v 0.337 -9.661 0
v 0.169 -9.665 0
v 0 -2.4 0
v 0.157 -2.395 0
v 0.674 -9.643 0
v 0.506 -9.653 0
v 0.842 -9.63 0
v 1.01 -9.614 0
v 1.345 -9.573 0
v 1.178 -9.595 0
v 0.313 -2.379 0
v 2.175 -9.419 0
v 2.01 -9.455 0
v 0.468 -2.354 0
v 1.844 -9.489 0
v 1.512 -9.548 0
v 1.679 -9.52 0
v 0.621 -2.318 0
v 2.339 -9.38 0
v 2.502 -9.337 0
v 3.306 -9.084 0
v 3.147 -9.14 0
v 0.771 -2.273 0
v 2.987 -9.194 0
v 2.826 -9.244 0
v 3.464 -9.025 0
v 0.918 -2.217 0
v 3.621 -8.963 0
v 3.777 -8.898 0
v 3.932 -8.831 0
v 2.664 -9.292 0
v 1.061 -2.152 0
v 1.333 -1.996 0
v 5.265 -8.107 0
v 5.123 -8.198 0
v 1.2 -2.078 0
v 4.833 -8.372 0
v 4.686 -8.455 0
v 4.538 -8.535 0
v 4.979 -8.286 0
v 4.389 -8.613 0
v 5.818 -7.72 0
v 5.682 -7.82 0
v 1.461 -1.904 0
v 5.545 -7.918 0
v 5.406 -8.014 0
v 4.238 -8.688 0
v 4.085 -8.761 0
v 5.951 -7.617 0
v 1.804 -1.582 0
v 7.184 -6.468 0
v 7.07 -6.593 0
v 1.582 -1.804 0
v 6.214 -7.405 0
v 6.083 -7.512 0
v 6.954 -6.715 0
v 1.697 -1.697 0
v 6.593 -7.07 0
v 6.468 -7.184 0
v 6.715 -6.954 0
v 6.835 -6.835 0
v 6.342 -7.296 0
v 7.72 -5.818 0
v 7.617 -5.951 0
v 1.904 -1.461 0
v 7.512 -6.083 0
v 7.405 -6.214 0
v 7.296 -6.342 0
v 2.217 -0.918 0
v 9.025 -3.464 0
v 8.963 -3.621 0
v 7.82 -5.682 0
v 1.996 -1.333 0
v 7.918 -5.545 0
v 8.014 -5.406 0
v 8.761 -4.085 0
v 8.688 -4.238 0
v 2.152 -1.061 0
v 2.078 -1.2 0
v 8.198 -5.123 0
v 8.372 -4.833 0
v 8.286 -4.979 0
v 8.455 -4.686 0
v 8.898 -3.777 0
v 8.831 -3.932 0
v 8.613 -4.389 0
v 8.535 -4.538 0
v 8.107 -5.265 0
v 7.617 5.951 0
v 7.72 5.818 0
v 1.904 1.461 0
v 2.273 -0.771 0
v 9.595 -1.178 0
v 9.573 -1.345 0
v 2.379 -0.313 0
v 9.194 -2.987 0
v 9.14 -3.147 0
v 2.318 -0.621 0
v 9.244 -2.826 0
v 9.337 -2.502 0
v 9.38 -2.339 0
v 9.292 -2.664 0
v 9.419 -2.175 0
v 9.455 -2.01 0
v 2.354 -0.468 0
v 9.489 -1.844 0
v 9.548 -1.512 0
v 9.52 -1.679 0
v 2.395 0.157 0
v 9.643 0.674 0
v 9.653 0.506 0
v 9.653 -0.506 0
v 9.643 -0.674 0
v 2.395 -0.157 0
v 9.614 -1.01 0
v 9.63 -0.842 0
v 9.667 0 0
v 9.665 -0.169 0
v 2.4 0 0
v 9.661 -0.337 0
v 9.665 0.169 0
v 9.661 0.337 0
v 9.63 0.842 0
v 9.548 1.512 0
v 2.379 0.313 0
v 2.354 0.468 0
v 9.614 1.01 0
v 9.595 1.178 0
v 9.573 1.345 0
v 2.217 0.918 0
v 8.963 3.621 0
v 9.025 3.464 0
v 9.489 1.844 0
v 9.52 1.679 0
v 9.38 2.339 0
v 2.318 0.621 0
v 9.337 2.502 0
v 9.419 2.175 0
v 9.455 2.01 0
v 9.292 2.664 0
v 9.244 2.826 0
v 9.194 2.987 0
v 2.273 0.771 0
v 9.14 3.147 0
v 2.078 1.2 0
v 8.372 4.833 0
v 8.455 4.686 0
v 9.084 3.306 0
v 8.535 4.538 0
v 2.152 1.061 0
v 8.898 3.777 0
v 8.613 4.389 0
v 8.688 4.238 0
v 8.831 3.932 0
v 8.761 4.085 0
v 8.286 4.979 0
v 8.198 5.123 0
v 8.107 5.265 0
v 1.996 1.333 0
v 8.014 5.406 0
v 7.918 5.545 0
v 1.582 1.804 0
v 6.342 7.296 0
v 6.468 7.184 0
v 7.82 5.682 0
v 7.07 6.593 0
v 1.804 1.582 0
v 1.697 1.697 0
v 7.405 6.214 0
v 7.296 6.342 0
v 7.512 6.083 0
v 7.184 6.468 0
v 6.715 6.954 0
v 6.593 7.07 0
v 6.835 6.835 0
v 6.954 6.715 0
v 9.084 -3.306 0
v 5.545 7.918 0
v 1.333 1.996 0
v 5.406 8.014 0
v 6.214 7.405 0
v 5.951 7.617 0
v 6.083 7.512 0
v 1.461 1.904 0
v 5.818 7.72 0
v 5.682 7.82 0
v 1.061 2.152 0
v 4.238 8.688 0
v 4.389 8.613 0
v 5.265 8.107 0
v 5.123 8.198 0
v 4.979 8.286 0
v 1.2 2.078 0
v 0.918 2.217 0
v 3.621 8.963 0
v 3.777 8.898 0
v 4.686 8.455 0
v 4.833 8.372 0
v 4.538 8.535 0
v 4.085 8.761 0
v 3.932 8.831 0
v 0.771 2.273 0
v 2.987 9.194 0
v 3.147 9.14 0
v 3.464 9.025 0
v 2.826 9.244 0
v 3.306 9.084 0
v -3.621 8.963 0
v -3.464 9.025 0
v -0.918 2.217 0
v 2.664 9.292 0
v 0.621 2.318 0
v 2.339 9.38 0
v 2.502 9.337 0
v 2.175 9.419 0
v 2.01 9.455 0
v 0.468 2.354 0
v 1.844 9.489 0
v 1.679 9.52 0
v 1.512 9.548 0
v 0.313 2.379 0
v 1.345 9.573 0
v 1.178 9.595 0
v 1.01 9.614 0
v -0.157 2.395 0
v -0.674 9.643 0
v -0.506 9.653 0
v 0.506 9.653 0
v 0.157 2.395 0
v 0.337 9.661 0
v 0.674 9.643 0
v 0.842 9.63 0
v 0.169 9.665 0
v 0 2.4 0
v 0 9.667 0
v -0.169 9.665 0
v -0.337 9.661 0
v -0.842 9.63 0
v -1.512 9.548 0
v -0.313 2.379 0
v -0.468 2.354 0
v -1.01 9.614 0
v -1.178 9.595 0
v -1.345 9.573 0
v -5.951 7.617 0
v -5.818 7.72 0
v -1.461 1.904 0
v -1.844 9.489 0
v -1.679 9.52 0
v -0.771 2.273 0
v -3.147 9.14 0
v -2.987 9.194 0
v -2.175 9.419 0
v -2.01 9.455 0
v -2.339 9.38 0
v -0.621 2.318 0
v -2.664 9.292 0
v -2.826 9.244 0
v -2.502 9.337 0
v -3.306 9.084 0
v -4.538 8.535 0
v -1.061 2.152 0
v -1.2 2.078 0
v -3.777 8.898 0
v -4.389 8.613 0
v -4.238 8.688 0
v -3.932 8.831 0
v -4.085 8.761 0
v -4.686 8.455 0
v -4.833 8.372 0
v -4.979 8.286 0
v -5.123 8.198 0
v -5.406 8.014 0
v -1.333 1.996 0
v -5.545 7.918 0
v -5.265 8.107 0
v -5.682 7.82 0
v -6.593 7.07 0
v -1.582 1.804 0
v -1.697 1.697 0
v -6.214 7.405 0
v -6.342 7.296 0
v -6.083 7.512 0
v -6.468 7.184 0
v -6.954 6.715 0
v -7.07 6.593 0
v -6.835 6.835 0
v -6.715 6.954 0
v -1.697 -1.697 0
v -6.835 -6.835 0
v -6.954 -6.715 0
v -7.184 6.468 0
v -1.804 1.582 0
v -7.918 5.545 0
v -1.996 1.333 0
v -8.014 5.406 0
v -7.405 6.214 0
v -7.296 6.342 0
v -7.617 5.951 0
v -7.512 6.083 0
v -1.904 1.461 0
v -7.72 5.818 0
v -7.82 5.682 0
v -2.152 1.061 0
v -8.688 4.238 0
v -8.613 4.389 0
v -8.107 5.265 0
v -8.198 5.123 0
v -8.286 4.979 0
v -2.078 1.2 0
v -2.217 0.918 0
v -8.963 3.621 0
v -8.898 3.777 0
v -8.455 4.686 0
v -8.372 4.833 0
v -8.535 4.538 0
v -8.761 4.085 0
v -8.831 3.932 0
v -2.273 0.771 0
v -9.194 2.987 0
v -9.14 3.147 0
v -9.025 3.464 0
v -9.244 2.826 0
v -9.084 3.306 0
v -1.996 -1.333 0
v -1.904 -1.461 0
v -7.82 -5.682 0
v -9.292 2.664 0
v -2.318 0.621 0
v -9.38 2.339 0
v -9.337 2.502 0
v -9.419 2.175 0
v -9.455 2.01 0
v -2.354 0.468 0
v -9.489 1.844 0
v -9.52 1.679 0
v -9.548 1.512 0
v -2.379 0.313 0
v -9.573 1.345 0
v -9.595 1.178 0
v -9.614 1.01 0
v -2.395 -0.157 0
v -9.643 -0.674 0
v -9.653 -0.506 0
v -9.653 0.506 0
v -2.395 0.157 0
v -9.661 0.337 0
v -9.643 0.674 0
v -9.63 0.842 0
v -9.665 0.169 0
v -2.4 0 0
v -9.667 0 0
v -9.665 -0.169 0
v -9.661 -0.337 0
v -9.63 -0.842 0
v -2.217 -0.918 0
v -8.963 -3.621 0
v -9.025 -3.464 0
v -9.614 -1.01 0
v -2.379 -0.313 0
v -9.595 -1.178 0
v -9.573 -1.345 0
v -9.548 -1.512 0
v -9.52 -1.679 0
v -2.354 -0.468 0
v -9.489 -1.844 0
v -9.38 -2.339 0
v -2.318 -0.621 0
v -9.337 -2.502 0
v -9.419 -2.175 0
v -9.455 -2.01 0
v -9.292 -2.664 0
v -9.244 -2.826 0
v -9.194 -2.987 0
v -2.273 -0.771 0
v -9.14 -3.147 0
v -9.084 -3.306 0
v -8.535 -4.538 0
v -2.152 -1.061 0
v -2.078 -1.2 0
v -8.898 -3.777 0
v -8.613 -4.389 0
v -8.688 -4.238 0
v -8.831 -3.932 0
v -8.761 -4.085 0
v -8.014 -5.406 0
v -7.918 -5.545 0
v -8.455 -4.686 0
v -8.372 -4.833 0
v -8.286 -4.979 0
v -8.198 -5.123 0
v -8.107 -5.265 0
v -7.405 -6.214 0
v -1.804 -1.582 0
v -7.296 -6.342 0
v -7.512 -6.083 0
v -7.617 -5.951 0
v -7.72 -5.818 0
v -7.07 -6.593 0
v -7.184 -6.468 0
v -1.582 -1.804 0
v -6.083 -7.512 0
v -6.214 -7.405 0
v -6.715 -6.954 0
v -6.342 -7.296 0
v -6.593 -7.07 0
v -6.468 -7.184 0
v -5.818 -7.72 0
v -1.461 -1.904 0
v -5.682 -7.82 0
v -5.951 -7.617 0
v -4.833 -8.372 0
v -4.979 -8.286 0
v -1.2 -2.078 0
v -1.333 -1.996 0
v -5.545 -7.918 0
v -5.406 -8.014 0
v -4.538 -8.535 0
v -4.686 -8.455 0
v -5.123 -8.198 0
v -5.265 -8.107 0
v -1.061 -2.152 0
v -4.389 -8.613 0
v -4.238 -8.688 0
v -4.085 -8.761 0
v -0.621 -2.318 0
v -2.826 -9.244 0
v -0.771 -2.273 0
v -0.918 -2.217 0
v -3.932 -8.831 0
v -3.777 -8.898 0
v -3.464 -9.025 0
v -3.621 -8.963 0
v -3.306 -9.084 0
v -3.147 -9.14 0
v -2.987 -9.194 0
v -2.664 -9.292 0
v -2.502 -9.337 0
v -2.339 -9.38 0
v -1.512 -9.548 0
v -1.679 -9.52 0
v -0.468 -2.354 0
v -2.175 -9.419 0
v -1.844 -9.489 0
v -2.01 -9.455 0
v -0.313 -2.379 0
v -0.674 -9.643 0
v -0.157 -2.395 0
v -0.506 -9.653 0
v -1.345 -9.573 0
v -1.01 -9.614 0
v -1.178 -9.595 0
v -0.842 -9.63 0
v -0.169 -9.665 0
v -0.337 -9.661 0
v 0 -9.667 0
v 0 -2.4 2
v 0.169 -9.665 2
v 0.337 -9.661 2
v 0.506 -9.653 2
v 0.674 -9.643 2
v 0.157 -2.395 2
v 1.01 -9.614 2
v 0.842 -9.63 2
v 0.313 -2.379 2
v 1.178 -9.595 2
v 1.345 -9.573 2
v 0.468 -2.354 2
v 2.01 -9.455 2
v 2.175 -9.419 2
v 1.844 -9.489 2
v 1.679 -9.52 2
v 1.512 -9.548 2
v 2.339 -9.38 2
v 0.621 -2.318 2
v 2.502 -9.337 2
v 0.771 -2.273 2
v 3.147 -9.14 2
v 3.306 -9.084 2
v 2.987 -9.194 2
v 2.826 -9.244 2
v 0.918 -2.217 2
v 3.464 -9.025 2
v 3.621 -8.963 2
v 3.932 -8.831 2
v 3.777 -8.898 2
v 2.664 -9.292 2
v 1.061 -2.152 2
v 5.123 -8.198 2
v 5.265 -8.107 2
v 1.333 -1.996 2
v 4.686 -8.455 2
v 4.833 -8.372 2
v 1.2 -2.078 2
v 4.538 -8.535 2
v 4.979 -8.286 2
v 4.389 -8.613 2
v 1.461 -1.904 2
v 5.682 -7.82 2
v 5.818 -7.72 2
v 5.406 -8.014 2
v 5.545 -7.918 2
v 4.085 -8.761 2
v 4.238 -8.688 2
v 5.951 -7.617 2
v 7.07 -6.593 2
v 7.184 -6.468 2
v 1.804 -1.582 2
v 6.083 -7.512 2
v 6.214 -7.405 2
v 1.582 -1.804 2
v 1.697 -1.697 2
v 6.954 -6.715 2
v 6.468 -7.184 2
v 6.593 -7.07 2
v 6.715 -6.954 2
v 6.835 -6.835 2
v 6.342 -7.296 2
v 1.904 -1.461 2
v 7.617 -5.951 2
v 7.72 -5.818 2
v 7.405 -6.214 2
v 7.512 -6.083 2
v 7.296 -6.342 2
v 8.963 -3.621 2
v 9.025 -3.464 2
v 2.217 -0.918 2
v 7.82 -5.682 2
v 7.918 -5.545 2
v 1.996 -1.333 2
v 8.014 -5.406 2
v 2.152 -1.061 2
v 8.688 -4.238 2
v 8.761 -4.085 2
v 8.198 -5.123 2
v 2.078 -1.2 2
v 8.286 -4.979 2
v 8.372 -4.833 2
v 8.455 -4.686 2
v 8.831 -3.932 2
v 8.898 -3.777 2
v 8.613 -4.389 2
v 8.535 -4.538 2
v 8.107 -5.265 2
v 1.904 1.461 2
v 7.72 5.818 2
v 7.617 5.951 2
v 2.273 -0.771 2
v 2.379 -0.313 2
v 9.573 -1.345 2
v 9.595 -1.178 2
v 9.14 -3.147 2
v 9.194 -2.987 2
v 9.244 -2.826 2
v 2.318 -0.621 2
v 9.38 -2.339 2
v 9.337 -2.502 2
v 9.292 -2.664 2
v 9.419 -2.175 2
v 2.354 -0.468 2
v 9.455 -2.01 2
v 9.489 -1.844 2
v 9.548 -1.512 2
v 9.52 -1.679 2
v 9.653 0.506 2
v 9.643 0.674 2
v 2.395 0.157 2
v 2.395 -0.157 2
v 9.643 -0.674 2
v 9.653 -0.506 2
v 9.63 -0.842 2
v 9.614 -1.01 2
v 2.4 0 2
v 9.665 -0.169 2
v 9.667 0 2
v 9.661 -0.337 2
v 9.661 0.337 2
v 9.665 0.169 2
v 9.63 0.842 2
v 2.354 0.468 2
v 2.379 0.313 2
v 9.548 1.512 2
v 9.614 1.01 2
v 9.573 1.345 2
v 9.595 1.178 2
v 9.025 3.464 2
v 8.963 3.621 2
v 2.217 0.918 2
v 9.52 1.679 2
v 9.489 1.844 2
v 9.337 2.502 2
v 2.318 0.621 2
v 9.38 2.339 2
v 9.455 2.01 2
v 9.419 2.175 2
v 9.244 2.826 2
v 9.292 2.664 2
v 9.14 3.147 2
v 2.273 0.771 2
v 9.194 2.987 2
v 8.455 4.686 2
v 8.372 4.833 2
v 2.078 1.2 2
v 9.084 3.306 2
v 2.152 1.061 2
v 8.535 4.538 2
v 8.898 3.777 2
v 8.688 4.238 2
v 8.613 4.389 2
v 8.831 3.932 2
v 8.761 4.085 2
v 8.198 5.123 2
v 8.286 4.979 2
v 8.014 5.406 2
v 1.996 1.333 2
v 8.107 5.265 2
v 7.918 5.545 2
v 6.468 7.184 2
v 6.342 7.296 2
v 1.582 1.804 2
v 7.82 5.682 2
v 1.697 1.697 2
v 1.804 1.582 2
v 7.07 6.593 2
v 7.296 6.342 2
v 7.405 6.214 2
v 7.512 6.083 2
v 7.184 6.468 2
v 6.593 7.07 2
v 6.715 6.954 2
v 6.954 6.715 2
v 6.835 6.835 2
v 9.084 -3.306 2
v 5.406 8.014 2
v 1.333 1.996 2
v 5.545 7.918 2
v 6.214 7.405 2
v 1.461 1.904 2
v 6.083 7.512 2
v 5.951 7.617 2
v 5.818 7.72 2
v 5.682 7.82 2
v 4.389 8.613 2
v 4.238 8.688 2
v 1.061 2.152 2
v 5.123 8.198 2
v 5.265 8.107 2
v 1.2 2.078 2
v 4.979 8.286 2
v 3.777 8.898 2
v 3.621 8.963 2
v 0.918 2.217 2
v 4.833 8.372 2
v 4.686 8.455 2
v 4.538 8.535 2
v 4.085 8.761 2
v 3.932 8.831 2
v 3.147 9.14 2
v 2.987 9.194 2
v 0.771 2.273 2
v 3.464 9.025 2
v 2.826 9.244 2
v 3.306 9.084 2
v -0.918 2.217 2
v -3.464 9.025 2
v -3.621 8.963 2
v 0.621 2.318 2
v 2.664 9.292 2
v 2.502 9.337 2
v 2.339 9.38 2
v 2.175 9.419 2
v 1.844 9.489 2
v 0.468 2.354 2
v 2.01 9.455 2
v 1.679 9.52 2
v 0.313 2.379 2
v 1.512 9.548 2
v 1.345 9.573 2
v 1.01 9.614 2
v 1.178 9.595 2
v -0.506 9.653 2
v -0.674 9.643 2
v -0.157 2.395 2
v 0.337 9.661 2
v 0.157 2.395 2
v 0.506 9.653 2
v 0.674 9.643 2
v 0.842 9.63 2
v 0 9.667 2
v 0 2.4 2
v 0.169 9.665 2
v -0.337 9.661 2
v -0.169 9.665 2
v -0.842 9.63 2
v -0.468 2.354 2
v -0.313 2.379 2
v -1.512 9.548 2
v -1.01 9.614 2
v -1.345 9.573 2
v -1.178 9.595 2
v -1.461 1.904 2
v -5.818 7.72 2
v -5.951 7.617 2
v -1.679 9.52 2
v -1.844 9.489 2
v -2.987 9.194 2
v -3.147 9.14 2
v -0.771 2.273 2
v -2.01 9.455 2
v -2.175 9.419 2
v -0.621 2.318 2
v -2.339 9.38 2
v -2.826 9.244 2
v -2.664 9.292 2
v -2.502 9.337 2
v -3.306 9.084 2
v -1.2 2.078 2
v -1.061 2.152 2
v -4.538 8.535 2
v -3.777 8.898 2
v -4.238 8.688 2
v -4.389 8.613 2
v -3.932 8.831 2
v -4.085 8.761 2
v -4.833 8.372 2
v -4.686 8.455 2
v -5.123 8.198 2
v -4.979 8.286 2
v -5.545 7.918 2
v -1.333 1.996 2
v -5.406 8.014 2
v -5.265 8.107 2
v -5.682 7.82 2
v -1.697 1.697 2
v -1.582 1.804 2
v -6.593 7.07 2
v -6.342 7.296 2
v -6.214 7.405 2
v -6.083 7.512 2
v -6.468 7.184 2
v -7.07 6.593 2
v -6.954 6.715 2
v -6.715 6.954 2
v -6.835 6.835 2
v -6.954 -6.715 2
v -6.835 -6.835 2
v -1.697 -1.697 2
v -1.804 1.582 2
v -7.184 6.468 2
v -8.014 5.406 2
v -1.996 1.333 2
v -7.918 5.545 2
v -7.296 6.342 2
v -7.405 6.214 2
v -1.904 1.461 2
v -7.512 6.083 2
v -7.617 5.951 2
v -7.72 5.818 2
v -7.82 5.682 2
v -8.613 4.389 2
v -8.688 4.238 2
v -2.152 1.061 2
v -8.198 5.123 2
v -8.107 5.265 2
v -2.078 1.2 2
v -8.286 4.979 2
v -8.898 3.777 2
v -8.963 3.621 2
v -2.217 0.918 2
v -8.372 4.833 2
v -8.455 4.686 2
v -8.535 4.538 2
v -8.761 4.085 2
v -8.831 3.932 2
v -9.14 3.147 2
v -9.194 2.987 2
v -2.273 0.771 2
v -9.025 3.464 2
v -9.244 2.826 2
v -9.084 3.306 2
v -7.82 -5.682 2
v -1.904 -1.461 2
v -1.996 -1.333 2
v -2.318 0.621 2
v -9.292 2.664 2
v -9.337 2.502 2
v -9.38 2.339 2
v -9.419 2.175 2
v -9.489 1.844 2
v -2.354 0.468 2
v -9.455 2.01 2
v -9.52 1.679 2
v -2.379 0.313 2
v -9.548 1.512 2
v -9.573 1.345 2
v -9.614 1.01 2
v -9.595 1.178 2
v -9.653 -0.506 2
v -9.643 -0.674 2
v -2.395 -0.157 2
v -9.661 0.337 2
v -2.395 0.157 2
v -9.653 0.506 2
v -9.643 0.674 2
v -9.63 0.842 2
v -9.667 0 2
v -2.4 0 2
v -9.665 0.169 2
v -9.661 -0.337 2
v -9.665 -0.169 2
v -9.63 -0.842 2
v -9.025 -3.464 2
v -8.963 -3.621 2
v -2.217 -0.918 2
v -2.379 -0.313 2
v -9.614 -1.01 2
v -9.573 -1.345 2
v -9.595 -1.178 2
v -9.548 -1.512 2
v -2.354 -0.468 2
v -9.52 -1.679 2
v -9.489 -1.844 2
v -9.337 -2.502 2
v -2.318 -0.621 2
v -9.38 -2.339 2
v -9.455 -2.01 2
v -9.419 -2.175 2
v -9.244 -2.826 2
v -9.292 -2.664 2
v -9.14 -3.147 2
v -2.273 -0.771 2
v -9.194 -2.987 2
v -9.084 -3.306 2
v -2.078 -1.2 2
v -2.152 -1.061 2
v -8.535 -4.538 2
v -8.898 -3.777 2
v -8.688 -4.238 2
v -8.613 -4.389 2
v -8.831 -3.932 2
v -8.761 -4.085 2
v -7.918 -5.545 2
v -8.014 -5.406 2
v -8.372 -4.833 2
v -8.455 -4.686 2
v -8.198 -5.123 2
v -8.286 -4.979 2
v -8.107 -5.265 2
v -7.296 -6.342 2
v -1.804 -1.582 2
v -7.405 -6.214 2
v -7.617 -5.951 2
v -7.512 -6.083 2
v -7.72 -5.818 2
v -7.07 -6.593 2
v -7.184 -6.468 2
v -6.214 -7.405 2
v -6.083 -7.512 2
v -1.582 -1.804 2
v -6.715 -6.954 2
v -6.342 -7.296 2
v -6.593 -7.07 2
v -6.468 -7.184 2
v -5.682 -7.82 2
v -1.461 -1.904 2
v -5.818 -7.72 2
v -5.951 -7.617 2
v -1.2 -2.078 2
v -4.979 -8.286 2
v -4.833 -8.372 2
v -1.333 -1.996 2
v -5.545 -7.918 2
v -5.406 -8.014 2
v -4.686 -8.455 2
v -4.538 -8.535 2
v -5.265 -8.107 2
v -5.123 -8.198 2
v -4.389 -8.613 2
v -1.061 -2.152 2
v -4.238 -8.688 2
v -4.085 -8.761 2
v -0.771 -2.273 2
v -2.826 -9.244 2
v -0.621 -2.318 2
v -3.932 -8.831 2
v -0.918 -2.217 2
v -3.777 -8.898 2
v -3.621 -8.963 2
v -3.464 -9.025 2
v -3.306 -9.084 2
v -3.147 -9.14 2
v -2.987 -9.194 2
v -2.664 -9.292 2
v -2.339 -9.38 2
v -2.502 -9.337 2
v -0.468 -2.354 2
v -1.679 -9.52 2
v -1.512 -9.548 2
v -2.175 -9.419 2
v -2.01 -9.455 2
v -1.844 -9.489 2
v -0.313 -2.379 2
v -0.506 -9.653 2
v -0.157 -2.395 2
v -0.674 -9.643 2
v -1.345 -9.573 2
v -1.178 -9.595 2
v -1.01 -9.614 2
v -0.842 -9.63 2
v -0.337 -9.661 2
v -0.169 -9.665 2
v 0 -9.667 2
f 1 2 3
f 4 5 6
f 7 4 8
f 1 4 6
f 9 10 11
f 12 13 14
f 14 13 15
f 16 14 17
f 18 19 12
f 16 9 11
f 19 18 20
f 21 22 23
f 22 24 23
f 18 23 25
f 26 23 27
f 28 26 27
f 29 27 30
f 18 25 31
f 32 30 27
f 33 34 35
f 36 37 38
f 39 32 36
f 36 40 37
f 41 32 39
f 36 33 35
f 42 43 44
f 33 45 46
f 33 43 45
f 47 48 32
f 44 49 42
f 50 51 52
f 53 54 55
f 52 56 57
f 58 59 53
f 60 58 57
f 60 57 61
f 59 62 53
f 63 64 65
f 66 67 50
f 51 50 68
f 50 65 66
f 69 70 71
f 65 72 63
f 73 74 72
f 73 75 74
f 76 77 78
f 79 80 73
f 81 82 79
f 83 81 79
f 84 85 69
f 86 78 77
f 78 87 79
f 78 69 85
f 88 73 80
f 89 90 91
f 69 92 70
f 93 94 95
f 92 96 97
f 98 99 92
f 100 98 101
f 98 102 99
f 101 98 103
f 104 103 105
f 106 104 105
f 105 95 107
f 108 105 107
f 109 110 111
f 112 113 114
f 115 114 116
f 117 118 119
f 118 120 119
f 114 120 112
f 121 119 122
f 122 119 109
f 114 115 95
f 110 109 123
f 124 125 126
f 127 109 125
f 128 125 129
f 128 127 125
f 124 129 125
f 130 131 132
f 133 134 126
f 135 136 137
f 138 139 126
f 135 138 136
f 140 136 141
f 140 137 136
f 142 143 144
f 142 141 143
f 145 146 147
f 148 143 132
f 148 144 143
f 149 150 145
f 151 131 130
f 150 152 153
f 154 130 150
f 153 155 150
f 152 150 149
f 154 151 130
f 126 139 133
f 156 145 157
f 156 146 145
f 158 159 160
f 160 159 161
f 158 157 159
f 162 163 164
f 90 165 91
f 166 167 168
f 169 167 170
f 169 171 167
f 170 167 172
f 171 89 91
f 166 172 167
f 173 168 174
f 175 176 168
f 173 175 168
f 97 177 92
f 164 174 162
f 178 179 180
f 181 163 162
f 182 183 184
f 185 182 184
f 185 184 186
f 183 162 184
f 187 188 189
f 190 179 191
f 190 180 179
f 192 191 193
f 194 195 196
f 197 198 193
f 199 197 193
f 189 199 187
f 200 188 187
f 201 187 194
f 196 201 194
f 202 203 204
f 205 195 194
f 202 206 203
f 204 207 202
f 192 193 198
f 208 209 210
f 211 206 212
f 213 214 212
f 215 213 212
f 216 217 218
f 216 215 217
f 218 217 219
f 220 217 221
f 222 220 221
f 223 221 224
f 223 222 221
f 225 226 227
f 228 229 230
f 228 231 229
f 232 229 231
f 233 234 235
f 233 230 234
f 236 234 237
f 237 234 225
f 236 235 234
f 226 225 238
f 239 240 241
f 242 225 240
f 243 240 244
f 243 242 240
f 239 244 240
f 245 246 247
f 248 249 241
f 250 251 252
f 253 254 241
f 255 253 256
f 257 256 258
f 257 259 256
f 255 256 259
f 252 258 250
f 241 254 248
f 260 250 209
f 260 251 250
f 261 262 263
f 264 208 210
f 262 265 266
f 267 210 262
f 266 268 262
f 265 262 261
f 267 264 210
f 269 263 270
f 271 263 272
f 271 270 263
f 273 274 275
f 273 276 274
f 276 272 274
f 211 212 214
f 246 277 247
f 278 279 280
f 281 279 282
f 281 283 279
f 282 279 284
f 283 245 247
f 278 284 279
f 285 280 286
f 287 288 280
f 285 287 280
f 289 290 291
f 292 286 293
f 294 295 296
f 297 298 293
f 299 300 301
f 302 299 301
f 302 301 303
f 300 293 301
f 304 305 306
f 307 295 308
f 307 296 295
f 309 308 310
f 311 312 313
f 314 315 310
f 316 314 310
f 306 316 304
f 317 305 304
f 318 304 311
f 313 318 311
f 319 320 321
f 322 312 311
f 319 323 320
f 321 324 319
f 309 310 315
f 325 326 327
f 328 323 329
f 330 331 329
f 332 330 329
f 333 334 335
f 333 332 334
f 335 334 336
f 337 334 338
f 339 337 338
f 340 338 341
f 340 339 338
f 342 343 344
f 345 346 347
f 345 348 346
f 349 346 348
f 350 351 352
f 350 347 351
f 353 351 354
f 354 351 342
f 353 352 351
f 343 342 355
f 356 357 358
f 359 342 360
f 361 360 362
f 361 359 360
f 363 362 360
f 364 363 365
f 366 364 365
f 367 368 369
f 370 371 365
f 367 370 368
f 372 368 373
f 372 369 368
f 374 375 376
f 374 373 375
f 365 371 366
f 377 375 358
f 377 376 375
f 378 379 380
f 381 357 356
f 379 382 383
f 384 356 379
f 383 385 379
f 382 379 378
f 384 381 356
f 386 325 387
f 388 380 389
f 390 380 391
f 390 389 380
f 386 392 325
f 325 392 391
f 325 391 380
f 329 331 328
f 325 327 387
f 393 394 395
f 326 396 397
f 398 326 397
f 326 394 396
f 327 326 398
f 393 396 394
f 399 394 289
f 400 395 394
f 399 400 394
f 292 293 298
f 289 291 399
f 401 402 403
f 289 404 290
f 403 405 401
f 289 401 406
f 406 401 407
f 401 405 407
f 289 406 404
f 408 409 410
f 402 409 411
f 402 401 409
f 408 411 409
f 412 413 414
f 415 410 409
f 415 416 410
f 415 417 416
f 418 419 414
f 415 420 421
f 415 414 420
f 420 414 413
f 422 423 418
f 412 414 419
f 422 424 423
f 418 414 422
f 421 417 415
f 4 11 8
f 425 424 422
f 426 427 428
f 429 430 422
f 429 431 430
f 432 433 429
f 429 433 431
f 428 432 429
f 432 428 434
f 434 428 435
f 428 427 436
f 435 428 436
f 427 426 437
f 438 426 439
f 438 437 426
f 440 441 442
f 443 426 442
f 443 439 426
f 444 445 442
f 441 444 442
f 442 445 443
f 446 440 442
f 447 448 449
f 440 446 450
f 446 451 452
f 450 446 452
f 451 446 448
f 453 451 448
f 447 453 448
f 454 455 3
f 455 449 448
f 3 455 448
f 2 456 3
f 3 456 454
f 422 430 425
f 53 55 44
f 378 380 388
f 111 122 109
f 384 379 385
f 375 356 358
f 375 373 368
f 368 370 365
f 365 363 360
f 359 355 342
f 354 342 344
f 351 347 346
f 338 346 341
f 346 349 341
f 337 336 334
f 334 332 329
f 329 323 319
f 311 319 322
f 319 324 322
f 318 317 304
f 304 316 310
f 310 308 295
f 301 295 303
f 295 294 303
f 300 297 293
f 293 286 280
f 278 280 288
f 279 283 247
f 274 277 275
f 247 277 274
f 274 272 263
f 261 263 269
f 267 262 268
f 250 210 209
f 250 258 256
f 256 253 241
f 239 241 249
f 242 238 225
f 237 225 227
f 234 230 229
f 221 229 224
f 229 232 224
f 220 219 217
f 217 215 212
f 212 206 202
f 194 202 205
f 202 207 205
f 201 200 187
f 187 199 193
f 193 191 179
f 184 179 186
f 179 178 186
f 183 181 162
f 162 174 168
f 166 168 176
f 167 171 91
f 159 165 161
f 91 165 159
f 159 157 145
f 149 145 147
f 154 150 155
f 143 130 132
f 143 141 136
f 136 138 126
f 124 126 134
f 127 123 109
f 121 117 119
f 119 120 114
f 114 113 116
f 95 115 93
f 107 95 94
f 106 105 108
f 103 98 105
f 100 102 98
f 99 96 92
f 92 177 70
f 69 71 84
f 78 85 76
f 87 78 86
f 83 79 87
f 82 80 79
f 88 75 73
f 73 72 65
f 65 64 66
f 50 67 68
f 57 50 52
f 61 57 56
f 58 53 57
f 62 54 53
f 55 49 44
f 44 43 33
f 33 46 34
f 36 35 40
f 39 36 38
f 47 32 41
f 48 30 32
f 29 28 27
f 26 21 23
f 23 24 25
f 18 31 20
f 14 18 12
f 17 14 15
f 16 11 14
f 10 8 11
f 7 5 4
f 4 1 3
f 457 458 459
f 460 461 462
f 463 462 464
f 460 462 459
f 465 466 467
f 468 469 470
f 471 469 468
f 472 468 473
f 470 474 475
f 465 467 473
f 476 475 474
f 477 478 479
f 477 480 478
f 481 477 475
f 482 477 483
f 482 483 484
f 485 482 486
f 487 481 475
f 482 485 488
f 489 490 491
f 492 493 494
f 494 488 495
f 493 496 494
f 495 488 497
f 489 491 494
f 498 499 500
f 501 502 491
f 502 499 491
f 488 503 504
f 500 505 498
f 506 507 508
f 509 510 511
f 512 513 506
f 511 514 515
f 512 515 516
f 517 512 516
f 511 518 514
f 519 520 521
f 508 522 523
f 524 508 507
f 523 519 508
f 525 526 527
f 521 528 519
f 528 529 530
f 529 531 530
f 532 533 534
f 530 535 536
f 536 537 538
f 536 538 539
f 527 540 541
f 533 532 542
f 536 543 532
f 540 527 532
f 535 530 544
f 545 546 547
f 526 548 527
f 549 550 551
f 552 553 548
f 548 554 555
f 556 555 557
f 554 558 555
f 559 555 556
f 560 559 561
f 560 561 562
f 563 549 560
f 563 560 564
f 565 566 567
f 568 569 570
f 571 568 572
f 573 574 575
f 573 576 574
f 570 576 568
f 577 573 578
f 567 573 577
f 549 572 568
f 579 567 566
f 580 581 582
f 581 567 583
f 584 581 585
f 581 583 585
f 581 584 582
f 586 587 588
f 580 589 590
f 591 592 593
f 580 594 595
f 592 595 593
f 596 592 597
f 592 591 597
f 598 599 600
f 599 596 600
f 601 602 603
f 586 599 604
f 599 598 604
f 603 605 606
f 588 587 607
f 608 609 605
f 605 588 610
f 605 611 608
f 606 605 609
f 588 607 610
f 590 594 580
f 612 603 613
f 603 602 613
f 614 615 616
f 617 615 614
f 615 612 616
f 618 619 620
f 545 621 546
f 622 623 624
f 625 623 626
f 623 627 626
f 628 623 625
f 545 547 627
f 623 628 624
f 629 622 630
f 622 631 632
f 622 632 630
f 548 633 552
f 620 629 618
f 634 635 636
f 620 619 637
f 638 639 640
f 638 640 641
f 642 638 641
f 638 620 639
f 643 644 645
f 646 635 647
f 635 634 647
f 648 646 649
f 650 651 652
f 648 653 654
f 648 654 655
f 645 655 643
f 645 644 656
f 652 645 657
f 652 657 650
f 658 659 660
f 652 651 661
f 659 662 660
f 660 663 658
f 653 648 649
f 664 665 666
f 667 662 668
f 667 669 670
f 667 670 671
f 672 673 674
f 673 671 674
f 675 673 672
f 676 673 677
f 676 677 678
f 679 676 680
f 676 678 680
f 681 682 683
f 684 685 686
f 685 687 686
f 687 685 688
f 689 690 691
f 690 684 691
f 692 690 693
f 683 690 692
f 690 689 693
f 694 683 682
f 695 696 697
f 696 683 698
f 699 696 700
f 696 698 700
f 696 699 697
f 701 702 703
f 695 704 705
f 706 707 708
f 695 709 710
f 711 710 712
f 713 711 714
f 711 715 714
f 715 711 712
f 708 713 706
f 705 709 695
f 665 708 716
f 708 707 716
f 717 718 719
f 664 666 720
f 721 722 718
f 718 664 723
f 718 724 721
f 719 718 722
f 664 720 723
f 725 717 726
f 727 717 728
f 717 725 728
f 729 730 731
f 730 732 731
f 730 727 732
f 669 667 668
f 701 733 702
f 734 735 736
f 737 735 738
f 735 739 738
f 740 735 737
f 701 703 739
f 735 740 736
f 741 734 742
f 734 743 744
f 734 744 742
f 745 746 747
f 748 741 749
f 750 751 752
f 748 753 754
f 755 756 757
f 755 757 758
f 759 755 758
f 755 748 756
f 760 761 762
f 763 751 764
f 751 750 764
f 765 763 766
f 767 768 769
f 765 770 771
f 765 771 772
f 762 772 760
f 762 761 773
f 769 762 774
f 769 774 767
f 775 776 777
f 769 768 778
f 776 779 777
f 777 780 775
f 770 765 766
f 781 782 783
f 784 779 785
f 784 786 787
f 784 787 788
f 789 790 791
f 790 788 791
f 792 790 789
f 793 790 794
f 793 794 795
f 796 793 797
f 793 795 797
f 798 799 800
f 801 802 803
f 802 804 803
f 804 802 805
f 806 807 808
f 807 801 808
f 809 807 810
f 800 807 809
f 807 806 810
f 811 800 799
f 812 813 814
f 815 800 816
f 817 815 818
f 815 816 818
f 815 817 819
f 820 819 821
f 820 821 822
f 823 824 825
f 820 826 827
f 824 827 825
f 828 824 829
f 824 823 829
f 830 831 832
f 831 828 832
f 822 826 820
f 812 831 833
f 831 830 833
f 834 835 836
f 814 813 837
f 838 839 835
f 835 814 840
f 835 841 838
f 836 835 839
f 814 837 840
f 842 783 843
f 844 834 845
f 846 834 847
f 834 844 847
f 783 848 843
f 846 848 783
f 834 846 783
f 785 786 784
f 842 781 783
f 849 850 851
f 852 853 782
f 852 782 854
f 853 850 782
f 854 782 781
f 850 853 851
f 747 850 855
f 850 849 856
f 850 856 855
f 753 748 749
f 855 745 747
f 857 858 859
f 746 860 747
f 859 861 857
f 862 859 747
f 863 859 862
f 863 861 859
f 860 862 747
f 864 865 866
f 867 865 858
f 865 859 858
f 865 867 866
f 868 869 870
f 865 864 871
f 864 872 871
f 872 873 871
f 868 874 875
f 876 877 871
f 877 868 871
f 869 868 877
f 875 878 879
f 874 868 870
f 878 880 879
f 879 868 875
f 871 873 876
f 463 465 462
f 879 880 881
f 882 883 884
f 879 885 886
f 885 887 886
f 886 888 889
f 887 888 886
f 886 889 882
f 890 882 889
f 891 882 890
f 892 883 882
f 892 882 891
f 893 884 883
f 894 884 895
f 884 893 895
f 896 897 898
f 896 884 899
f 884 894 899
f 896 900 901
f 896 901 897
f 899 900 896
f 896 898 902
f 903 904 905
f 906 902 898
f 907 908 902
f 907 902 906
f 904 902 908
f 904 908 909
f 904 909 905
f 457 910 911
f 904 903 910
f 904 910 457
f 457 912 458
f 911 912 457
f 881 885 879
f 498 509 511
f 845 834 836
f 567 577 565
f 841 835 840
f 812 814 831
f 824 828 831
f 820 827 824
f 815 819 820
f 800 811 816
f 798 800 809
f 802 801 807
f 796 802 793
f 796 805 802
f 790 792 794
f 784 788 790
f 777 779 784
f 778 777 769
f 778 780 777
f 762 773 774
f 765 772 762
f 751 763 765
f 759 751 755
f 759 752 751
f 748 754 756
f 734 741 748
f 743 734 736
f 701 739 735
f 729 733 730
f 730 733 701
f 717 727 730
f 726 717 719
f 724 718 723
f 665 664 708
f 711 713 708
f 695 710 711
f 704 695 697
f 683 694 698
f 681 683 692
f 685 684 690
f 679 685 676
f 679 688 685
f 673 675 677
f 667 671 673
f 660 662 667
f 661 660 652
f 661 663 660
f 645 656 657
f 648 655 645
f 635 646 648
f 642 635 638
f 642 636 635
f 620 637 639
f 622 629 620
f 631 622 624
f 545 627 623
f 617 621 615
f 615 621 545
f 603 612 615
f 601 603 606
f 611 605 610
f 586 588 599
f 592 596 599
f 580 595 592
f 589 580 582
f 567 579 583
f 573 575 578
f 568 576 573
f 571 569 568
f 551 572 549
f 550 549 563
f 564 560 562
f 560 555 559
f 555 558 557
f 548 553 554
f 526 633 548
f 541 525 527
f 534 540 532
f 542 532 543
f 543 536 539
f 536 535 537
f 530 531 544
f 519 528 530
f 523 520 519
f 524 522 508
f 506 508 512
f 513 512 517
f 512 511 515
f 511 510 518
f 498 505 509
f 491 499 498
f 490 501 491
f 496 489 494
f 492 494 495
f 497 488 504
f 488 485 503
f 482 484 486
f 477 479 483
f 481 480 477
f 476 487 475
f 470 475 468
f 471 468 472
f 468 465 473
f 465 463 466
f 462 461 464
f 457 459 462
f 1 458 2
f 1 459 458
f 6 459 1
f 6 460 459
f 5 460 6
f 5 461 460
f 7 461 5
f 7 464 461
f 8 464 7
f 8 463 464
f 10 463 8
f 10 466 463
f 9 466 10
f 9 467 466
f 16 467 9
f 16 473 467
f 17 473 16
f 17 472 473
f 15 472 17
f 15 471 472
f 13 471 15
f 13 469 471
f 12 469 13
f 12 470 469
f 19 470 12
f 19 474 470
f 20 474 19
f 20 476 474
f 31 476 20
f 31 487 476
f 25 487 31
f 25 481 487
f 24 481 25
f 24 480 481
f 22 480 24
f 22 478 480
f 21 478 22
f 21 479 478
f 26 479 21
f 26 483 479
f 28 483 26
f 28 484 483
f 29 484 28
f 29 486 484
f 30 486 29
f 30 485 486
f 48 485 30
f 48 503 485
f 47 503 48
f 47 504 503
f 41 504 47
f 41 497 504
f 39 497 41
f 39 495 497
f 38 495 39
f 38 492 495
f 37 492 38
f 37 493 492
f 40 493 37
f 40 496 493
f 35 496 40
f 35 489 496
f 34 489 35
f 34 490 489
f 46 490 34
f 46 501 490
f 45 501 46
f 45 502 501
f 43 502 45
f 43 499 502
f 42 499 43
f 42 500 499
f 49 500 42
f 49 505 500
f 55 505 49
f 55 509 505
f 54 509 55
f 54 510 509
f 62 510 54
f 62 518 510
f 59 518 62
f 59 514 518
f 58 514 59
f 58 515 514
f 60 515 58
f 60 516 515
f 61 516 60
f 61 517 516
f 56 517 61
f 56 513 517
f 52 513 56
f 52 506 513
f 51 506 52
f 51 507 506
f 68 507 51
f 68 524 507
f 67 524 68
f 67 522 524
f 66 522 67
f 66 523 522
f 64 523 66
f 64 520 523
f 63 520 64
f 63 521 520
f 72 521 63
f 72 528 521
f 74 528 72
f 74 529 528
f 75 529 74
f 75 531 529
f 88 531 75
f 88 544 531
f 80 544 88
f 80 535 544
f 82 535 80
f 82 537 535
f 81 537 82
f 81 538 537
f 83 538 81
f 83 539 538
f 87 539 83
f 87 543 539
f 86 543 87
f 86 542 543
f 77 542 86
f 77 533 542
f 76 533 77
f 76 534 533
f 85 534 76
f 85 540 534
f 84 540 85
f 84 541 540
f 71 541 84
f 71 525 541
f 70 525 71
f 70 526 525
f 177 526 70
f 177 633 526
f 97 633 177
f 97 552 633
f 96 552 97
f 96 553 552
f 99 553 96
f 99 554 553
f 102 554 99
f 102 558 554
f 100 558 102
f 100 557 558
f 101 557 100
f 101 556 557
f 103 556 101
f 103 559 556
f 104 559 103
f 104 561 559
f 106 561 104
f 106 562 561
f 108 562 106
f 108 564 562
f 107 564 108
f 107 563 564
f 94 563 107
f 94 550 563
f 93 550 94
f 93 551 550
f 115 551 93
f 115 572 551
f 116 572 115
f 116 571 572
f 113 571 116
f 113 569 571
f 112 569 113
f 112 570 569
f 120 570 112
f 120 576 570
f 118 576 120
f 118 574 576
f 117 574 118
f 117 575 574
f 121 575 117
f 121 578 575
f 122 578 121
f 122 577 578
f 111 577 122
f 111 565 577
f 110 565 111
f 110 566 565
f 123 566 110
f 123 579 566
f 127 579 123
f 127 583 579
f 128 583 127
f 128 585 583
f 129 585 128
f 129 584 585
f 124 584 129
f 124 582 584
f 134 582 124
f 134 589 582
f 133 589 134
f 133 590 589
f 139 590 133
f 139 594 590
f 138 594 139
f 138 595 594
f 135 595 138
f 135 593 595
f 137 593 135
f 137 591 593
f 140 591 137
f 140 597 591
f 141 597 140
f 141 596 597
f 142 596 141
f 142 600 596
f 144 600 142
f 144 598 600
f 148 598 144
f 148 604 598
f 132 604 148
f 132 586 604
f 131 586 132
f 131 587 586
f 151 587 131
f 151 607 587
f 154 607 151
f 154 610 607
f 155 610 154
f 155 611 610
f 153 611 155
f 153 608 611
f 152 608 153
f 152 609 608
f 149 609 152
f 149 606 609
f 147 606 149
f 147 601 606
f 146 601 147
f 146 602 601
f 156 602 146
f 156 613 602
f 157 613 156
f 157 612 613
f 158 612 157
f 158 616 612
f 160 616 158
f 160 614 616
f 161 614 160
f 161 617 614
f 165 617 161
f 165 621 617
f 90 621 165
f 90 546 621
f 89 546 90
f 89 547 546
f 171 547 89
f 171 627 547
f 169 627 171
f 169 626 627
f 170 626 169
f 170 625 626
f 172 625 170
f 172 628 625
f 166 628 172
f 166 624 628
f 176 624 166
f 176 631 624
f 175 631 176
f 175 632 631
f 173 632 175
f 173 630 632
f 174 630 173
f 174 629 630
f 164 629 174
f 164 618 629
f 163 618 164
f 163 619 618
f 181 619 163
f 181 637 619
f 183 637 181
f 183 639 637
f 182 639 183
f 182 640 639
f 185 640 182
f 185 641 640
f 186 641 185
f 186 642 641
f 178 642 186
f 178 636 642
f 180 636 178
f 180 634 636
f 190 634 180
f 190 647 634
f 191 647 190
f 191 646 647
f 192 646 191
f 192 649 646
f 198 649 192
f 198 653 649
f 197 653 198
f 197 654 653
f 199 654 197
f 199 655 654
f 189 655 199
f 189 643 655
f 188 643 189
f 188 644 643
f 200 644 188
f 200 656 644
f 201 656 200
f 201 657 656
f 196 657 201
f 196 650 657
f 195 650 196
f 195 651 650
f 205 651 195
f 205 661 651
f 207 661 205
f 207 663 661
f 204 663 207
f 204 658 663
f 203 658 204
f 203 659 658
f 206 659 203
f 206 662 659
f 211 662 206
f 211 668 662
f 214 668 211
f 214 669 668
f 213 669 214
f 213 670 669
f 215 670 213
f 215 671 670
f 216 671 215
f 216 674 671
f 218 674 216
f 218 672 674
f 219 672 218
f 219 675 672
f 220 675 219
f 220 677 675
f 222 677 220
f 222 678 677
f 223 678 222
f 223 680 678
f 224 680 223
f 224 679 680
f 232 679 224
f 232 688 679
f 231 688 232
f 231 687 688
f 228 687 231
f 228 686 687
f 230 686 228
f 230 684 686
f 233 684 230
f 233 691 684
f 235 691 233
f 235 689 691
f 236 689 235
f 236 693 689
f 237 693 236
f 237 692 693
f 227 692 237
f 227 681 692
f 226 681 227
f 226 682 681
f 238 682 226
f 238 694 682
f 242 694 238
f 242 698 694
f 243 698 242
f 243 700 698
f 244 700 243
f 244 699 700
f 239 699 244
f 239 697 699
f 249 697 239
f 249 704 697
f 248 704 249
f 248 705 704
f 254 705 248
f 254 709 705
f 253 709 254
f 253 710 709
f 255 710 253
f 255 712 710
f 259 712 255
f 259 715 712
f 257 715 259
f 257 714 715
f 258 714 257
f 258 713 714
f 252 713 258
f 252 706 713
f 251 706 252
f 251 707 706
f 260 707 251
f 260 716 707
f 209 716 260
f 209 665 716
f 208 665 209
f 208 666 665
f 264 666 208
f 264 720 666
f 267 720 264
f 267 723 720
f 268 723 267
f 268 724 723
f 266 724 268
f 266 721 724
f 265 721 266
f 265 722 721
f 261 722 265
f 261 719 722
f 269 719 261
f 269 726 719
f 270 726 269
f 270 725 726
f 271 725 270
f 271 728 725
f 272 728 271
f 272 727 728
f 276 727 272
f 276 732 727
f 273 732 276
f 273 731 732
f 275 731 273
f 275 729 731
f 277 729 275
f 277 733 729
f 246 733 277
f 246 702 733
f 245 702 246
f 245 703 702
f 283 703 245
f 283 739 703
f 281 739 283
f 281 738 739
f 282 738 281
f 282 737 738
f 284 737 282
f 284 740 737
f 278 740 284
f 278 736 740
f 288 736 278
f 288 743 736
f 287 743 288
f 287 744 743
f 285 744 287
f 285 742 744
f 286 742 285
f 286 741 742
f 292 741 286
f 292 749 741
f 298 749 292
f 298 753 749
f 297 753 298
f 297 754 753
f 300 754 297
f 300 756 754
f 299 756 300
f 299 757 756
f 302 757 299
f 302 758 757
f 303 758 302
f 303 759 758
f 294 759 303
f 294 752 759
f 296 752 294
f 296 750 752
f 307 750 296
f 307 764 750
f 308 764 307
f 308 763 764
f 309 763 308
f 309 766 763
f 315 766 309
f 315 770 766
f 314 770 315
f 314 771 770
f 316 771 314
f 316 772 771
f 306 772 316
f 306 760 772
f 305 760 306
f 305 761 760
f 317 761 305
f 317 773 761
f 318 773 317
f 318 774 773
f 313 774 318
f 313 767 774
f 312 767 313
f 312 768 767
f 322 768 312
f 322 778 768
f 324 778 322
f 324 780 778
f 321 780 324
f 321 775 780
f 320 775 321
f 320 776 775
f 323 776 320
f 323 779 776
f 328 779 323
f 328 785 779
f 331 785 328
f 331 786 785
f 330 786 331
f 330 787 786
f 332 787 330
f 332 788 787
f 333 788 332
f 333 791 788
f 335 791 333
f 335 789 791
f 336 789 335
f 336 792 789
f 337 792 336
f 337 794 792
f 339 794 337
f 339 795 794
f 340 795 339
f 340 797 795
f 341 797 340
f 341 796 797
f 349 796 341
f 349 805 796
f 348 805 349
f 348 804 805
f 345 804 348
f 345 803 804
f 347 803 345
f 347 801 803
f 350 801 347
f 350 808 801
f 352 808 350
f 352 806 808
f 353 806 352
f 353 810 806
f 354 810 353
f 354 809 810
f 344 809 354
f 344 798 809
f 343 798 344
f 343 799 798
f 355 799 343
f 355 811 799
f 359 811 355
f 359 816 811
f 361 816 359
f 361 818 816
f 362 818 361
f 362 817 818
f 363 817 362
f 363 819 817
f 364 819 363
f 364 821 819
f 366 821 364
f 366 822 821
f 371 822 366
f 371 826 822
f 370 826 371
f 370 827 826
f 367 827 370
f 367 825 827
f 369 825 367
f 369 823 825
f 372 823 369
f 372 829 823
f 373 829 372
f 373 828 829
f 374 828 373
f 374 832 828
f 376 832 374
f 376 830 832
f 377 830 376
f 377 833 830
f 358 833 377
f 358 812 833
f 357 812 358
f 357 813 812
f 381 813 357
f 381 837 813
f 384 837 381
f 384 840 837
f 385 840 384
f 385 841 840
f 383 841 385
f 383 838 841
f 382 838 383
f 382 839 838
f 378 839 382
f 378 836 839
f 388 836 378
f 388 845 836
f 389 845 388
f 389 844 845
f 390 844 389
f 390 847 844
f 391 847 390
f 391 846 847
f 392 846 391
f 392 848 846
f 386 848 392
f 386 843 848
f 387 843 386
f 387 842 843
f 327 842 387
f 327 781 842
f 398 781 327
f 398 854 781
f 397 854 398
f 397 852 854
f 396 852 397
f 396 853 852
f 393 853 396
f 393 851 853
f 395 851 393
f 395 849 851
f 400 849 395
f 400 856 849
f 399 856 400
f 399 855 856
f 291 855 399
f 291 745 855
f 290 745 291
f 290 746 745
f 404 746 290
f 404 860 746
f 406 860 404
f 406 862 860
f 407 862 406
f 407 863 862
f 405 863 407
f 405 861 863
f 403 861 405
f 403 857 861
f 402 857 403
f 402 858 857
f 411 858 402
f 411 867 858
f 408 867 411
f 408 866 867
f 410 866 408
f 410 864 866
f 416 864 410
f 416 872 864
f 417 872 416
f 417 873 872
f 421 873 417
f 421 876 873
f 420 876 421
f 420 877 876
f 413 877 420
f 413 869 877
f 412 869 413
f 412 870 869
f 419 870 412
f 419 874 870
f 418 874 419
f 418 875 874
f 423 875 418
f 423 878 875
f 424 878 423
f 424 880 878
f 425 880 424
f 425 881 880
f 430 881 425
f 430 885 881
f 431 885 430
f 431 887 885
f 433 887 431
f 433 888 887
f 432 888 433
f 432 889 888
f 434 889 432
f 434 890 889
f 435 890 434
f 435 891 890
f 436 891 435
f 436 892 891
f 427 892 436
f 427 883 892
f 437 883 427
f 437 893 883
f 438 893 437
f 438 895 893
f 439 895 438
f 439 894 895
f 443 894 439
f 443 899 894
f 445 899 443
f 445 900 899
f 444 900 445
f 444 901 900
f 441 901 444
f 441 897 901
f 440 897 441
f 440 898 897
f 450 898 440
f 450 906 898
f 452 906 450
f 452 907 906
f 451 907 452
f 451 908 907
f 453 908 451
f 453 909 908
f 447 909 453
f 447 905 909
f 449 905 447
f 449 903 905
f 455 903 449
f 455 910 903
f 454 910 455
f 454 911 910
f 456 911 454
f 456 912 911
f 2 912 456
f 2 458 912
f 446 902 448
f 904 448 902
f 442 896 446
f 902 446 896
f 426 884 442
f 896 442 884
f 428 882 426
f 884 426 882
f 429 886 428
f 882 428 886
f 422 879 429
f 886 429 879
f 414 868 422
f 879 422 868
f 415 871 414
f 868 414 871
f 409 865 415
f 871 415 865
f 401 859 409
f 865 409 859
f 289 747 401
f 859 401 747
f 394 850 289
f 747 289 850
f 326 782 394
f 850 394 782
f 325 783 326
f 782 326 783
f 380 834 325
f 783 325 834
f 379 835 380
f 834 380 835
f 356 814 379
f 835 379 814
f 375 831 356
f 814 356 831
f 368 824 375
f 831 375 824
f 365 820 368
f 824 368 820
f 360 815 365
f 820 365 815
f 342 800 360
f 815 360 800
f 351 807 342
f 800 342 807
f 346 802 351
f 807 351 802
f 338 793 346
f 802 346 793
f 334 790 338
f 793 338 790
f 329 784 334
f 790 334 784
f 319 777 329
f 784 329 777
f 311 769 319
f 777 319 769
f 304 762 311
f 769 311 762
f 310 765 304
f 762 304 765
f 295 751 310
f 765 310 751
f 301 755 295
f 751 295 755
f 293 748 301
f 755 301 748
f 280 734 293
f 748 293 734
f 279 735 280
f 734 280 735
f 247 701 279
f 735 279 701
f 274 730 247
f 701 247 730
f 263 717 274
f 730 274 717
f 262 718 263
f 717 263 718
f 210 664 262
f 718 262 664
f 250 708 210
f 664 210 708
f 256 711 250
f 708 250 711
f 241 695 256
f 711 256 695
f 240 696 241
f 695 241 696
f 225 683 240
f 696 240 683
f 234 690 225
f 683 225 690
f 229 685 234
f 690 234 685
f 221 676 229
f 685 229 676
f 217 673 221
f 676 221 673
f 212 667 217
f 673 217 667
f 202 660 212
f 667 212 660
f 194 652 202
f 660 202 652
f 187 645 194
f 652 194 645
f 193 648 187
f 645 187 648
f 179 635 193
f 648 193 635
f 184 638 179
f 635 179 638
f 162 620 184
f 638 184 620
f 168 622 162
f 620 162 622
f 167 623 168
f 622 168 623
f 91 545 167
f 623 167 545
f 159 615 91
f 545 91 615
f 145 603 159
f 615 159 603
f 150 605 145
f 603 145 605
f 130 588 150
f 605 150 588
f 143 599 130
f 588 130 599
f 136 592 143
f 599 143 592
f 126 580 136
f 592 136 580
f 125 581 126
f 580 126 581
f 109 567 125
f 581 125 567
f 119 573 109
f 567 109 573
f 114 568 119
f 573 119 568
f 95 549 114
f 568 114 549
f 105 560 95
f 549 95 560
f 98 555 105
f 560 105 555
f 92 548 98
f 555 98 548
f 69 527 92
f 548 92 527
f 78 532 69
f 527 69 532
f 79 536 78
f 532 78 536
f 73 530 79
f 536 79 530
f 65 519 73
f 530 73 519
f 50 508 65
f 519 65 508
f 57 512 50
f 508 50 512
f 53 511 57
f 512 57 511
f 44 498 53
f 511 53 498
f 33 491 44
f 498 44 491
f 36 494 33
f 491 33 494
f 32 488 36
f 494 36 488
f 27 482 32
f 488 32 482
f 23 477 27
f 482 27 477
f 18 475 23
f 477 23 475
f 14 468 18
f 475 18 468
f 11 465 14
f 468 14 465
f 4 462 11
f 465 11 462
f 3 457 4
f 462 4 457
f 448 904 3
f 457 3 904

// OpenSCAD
/***
 * @function circle_body_alternative
 * @brief Circle alternative: The contrasting family controls shown as a body.
 * Source: [`functions/circle/curve_gear_circle_body_alternative.scad`](functions/circle/curve_gear_circle_body_alternative.scad)
 * This uses the same curve, tooth scale and bore as the family gear alternative.
 * A 2 mm plate matches the alternative pair and mate while retaining the 4.8 mm bore.
 * @image ../images/functions/circle/curve_gear_circle_body_alternative.png Circle body alternative
 * @image ../utils/doxydown-support/table-spacer.png ⠀
 */
use <curve_gear_circle_alternative.scad>;
include <../../palette.scad>;
$fn=0; // Match the canonical view tessellation.
_alternative_example_circle(view="body");
